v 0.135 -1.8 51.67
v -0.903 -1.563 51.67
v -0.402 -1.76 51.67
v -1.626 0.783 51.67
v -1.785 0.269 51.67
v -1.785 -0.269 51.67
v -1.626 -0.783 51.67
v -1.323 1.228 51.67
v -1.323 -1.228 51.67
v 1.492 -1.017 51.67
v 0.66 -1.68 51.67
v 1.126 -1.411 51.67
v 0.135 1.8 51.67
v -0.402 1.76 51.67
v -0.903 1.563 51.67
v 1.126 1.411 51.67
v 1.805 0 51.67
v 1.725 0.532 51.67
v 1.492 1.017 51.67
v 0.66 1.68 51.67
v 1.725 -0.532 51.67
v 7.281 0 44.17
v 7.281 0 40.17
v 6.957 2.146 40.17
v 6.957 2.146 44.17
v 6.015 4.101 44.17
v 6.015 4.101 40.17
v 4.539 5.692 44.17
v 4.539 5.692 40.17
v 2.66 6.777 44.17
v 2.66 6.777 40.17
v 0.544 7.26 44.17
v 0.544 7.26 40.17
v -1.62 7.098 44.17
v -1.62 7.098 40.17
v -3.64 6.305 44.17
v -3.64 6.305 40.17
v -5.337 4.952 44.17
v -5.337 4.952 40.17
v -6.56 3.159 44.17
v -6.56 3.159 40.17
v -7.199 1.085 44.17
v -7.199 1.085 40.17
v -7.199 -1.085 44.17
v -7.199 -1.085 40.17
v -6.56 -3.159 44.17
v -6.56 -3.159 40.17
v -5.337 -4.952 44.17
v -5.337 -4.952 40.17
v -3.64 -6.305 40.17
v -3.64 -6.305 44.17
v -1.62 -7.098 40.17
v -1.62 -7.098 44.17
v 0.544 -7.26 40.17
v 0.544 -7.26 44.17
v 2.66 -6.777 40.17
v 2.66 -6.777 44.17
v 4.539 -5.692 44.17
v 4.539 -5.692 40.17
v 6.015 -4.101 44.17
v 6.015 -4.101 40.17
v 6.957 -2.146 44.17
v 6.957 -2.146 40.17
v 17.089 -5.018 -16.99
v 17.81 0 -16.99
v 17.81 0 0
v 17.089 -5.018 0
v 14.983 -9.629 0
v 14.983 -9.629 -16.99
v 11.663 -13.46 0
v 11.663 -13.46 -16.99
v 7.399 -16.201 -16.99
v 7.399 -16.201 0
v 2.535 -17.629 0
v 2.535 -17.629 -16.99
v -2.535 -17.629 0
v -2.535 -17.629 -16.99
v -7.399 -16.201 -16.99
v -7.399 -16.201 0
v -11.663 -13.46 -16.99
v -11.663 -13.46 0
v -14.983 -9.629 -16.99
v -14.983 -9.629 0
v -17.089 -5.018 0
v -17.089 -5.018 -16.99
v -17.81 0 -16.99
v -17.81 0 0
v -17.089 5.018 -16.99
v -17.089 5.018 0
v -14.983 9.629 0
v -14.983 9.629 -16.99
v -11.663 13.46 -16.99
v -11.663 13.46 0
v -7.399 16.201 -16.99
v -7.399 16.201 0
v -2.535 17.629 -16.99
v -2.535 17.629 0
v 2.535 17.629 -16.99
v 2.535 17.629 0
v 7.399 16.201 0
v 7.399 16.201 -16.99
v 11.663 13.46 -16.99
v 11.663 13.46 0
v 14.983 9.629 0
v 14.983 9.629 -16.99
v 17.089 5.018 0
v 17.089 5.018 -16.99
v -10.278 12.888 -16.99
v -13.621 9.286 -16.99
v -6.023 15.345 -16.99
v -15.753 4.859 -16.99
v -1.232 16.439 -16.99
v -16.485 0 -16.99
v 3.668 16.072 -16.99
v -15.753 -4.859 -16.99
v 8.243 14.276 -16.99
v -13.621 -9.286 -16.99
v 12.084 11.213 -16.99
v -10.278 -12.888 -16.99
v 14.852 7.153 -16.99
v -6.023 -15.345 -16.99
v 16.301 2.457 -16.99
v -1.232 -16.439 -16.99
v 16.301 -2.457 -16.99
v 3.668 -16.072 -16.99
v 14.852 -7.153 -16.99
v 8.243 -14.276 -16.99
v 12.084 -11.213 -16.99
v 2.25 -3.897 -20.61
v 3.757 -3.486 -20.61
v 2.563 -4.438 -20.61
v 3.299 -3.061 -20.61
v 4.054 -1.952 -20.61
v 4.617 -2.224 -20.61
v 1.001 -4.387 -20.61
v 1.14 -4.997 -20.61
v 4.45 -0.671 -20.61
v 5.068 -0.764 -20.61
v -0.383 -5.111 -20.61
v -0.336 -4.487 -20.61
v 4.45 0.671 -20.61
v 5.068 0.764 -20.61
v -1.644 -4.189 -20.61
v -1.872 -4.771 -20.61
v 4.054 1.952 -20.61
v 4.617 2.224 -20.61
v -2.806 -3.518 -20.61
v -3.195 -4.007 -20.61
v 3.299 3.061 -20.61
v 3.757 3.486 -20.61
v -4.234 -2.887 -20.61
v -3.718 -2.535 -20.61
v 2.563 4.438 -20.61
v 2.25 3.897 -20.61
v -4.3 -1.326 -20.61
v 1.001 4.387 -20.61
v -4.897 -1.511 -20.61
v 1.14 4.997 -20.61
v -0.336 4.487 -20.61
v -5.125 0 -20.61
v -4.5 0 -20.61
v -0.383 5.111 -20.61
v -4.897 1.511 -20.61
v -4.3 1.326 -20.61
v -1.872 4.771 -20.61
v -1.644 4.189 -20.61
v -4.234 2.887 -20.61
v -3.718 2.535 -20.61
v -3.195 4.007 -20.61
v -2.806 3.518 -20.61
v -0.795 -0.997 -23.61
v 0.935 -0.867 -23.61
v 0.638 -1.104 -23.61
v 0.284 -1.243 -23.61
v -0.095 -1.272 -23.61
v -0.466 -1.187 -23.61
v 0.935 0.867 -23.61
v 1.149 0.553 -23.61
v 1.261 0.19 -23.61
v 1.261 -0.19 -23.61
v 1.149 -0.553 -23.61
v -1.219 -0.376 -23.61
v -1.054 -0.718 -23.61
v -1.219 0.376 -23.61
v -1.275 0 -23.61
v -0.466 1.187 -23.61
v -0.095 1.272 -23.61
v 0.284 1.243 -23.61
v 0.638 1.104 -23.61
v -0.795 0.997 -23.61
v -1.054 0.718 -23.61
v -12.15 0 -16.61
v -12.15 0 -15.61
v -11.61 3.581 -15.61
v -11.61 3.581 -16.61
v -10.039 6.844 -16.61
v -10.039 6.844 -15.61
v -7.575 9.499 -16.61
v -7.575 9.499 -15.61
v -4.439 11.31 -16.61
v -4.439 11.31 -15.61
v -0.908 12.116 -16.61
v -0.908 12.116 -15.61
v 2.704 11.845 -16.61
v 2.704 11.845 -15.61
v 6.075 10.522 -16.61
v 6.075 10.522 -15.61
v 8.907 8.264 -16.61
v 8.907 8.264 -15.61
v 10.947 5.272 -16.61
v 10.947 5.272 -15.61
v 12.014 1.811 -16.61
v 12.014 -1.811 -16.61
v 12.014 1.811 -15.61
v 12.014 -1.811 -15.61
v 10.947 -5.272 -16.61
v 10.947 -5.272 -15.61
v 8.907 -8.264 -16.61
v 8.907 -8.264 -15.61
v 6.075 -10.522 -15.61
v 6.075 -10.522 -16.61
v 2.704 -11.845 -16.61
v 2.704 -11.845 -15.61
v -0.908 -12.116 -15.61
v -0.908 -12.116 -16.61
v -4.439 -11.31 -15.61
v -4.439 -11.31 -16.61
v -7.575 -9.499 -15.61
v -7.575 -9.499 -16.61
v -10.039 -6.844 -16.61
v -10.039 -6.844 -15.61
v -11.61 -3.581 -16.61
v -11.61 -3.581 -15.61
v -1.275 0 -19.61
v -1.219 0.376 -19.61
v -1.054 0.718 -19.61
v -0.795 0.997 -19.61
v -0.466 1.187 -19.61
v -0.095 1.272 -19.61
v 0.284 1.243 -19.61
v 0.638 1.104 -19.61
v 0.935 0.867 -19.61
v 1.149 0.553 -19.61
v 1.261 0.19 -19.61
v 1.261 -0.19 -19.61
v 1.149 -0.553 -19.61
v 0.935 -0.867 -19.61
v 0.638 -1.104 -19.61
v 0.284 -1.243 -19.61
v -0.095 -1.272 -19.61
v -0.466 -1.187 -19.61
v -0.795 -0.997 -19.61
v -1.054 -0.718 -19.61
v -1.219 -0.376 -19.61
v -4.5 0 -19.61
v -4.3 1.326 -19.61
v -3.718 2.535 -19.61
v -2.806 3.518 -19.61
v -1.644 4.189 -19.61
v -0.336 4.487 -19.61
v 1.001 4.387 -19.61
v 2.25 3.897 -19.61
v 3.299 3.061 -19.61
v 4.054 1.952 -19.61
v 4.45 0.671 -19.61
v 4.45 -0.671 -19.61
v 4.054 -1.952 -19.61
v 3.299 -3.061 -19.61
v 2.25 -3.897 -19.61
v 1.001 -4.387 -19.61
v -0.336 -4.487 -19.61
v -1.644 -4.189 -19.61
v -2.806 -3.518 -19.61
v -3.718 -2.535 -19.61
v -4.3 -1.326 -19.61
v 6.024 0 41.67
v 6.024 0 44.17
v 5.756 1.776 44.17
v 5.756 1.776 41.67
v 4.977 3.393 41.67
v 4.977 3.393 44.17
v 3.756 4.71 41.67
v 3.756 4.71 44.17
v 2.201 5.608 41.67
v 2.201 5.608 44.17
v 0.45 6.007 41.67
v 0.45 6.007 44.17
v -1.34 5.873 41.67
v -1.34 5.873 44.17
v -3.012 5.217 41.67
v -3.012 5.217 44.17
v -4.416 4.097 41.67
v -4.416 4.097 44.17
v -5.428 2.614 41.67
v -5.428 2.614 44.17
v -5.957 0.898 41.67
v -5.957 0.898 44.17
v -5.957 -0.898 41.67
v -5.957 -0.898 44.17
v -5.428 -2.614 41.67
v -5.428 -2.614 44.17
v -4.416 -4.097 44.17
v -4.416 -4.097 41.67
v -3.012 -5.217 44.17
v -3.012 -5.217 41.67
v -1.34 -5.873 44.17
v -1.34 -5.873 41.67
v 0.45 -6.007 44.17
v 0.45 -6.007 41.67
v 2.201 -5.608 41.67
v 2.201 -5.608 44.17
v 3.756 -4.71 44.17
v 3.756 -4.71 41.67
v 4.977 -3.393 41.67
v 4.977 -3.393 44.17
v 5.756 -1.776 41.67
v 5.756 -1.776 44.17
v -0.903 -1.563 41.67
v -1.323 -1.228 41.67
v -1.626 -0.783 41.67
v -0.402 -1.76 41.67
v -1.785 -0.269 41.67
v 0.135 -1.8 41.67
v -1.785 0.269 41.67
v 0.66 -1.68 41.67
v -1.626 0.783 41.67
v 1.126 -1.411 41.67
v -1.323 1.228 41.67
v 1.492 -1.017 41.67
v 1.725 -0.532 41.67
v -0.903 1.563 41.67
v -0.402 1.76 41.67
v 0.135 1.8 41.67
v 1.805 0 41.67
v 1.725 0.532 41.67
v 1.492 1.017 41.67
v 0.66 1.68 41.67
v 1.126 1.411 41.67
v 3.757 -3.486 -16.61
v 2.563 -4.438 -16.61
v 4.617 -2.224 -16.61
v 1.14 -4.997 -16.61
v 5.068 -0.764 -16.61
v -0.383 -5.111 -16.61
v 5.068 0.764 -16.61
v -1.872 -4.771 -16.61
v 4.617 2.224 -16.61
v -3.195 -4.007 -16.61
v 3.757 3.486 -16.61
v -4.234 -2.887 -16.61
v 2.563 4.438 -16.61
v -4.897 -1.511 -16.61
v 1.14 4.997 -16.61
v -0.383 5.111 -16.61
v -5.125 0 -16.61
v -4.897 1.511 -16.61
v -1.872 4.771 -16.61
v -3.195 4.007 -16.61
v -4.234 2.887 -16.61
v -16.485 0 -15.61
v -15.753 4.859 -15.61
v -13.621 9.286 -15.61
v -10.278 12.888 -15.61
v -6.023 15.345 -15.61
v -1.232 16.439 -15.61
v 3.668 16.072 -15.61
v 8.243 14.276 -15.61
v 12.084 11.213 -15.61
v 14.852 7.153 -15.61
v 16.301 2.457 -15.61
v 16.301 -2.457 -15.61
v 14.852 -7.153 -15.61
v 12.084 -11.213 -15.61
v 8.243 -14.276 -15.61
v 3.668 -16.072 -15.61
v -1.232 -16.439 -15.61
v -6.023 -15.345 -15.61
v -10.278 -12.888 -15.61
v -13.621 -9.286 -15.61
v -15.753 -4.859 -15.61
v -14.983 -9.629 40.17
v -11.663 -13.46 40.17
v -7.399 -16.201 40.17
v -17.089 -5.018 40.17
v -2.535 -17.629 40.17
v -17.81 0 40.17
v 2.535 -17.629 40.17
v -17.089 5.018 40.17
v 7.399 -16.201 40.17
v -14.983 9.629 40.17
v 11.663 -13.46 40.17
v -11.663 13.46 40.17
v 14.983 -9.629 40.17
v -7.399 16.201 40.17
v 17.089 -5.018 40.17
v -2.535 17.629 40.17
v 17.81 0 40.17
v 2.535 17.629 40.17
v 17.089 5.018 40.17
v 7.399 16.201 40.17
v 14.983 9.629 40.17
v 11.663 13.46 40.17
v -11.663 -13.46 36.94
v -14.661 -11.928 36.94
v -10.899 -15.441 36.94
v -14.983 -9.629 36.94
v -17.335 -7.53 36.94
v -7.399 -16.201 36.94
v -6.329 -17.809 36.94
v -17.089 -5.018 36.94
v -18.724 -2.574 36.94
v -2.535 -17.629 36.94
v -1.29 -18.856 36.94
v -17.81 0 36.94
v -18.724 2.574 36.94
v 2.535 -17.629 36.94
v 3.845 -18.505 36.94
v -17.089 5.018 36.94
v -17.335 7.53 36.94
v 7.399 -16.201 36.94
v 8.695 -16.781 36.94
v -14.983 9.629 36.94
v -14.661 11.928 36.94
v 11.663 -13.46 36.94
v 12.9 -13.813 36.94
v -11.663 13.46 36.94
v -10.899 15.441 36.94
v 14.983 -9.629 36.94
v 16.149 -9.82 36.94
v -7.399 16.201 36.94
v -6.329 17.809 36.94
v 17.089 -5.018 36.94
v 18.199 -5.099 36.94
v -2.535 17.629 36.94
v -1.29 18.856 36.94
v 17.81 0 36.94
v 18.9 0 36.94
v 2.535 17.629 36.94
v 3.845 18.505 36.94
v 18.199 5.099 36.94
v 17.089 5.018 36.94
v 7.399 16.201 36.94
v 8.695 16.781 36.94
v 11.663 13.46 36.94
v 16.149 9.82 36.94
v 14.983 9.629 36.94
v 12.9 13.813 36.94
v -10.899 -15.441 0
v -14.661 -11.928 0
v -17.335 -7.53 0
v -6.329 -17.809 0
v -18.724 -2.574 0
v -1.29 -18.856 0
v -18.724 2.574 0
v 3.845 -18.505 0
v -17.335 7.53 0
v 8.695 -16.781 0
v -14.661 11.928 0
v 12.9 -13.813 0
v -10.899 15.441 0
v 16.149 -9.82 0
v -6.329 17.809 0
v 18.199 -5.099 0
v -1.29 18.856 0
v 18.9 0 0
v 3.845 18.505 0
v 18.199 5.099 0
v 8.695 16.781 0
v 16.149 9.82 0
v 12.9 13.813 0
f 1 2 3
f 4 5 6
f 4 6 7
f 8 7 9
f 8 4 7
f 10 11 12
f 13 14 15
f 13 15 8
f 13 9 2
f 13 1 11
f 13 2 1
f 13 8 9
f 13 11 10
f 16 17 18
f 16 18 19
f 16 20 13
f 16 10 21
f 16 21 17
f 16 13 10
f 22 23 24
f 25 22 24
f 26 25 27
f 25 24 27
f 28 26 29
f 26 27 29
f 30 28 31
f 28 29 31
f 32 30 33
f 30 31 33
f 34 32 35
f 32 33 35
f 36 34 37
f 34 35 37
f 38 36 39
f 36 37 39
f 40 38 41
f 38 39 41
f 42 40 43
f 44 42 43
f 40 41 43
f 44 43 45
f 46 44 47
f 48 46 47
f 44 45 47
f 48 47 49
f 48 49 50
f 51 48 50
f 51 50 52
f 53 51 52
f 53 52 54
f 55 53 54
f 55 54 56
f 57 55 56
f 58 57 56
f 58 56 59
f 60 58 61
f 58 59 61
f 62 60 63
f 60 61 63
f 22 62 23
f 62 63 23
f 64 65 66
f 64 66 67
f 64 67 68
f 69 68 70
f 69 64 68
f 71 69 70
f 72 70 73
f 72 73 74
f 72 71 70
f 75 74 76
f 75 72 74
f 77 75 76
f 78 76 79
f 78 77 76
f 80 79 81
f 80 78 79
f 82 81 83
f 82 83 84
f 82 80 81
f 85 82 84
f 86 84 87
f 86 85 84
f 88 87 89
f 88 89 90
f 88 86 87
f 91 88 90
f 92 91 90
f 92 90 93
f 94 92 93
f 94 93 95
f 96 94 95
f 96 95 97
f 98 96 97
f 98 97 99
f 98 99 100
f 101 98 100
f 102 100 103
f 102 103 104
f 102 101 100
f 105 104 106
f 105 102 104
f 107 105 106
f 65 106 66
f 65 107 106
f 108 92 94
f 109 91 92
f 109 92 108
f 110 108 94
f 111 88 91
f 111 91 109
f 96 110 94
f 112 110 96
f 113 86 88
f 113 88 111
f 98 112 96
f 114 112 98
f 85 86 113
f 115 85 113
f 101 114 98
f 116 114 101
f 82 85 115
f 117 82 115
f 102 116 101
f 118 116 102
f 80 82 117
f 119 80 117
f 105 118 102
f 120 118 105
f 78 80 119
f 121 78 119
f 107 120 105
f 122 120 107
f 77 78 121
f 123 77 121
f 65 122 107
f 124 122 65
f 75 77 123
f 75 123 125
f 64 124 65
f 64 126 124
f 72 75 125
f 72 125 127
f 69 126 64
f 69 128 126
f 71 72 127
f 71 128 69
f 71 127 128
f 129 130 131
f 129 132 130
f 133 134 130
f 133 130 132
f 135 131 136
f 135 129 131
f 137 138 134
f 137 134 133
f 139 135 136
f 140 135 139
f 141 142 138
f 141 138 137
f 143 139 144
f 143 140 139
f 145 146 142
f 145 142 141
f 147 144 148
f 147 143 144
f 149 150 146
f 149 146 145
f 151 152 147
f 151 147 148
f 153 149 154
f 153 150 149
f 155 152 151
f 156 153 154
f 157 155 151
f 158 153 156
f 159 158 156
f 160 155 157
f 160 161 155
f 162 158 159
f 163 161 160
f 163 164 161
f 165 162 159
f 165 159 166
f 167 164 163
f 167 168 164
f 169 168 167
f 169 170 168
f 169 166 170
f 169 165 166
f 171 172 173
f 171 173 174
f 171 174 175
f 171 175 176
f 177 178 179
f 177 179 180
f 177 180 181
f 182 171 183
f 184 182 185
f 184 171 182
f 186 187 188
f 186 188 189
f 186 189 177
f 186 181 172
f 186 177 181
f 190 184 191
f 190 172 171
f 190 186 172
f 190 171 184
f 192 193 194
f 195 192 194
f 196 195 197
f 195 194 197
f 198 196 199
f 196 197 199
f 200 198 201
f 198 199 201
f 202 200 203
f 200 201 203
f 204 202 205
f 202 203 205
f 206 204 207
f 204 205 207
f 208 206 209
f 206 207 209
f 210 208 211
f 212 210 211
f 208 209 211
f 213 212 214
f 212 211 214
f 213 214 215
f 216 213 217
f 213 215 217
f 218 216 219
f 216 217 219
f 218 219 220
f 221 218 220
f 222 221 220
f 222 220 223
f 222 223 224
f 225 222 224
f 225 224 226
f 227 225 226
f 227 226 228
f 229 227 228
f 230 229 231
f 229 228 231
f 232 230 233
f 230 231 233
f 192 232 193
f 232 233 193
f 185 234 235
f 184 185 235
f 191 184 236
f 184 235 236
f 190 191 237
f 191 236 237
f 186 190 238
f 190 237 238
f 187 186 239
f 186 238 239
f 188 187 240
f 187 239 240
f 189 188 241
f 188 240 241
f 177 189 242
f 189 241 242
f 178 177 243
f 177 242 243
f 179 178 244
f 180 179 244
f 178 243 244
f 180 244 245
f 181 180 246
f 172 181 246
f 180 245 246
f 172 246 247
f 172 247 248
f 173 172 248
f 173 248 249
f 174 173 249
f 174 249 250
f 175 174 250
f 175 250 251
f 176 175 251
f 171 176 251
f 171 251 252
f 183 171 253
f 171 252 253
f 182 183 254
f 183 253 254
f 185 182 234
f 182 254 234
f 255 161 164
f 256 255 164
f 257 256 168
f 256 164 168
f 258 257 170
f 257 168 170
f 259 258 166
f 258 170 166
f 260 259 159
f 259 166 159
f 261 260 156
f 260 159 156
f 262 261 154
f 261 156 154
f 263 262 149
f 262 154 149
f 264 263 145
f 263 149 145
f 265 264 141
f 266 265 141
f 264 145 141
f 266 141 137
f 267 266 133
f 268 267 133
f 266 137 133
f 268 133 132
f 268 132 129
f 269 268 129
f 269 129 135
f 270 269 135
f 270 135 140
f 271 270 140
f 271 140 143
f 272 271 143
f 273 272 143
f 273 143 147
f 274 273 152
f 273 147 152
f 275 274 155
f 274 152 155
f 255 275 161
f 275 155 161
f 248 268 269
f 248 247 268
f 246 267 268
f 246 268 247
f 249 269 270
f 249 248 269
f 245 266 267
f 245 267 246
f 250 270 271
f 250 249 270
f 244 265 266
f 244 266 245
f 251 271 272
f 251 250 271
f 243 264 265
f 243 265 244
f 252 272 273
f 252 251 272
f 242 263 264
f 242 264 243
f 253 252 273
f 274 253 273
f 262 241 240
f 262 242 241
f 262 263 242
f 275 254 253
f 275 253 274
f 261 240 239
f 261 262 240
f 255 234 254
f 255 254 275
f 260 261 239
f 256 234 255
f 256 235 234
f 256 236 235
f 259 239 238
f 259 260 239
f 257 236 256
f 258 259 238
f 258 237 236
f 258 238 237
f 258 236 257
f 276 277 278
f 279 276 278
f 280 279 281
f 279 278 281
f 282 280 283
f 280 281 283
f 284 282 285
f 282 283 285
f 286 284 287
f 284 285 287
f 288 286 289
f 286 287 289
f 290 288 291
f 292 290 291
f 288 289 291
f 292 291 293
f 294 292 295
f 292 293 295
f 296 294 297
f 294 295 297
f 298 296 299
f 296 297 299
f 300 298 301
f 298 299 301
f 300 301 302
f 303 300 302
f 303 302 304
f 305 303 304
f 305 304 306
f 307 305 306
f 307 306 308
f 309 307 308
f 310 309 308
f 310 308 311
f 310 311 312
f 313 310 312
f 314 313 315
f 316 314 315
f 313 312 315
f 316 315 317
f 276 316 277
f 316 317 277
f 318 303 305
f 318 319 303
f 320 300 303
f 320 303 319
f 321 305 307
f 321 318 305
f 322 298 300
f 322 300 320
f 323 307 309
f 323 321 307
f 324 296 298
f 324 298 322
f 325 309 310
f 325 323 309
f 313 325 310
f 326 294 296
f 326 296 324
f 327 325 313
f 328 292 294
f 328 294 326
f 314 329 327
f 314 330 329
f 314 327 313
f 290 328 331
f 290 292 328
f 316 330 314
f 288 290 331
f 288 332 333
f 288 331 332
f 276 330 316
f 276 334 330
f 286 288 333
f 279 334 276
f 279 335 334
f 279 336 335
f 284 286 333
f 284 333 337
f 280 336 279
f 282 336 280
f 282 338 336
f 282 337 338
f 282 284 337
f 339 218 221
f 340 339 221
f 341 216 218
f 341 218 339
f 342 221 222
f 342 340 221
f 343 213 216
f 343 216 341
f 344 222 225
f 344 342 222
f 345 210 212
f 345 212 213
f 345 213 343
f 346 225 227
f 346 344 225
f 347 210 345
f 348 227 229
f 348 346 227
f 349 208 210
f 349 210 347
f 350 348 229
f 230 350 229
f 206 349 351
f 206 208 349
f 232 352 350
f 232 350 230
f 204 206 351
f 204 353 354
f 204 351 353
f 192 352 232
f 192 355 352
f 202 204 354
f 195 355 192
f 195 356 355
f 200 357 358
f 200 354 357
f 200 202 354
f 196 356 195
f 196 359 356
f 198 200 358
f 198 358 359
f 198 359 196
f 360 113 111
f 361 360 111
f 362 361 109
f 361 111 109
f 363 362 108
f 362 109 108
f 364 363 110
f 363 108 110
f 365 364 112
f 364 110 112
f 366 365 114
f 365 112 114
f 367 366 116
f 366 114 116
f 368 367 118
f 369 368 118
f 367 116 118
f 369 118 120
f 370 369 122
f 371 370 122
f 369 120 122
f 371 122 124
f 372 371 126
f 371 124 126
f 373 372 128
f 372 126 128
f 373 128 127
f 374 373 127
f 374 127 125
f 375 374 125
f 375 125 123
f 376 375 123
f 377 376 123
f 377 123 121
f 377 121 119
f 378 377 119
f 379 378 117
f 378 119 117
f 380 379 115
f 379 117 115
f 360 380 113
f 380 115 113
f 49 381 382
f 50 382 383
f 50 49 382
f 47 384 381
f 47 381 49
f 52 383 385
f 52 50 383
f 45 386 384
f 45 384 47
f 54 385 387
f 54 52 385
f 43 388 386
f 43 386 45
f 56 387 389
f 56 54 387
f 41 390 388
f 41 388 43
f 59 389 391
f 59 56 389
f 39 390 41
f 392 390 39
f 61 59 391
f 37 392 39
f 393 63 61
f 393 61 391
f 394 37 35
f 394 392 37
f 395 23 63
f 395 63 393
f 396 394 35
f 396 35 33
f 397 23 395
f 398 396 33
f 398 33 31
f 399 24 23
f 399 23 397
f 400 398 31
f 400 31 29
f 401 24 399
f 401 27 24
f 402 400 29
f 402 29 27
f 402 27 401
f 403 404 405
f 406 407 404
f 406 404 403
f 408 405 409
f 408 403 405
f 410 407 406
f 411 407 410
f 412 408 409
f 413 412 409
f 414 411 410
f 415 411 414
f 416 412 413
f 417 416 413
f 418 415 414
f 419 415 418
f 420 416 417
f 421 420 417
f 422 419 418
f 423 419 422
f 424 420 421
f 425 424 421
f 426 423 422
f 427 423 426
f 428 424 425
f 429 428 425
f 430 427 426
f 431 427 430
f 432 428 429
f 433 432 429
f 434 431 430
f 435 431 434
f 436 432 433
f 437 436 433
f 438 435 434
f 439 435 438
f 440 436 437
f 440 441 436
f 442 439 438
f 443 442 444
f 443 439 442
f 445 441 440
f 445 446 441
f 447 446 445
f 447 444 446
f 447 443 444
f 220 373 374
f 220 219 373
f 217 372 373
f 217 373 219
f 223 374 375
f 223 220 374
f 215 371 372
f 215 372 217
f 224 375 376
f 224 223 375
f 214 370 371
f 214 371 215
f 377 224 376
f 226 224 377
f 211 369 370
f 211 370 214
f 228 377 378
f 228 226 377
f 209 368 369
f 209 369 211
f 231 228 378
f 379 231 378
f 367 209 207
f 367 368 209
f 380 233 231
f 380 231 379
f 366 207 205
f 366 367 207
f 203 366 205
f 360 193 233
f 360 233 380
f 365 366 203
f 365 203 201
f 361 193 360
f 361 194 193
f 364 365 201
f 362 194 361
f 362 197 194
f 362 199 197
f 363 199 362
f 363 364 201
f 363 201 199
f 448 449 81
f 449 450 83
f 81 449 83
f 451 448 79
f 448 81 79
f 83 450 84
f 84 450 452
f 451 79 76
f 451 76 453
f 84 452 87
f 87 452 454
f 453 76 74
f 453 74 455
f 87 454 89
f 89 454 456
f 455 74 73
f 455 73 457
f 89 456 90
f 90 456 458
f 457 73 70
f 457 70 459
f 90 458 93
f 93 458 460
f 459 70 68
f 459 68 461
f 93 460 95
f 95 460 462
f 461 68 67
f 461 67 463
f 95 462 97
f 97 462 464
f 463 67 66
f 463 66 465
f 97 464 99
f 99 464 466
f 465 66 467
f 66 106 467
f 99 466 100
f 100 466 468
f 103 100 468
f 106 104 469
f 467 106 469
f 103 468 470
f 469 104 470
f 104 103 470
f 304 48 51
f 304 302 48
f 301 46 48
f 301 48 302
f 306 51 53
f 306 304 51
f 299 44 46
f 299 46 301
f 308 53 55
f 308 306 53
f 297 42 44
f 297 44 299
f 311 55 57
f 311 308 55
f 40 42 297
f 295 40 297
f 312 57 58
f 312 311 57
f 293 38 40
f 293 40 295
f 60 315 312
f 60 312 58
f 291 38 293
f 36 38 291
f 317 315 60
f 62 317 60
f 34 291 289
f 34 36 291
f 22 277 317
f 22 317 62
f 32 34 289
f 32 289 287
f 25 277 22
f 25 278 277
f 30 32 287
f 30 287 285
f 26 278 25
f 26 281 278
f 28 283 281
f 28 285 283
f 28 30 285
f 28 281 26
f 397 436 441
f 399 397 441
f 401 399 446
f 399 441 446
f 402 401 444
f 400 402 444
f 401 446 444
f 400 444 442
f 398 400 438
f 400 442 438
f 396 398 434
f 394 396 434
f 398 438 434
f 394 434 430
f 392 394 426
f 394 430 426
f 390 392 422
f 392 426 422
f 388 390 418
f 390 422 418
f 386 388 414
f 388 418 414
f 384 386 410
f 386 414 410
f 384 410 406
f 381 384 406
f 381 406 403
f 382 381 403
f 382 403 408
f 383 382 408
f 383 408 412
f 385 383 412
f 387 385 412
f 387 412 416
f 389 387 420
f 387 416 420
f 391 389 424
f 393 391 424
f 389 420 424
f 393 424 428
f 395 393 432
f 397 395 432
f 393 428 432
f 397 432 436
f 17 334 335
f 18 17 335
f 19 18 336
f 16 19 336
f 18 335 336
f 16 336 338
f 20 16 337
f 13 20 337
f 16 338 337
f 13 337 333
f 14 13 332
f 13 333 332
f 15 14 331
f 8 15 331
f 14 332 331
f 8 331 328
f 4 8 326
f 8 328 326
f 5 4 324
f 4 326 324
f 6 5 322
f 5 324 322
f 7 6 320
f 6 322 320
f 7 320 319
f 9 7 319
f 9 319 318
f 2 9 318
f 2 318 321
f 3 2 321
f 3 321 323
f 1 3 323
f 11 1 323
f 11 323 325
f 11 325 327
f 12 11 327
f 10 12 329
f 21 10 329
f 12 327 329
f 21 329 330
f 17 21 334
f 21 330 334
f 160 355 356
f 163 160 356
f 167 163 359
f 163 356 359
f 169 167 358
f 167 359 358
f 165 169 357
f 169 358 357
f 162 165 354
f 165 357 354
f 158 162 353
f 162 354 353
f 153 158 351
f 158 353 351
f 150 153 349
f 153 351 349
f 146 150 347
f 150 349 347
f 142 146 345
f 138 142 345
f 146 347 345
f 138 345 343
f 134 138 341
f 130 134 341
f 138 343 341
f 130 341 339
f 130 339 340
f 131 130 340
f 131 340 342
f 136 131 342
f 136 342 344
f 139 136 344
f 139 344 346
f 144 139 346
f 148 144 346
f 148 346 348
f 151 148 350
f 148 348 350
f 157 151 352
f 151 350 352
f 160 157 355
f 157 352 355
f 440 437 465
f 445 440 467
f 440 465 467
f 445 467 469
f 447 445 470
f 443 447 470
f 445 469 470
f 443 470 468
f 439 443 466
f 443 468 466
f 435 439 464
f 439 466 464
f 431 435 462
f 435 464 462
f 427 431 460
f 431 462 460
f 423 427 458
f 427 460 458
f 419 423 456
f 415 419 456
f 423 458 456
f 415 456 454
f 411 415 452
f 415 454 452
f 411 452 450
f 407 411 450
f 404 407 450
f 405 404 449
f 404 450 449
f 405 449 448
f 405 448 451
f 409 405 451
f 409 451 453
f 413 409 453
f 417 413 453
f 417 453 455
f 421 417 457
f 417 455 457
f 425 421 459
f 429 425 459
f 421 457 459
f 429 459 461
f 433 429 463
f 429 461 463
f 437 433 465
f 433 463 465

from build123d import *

# Parameters (mm, degrees)
SKETCH_1_R          = 18.9
EXTRUDE_1_DEPTH     = 36.94
SKETCH_2_R          = 17.81
EXTRUDE_2_DEPTH     = 3.23
EXTRUDE_START       = 16.99
SKETCH_3_R          = 17.81
EXTRUDE_3_DEPTH     = 16.99
SKETCH_4_R          = 16.485
CUT_EXTRUDE_1_DEPTH = 1.38
SKETCH_5_R          = 12.15
EXTRUDE_4_DEPTH     = 1
SKETCH_6_R          = 5.125
EXTRUDE_5_DEPTH     = 4
SKETCH_7_R          = 4.49987444
CUT_EXTRUDE_2_DEPTH = 1
SKETCH_8_R          = 1.275207664
EXTRUDE_6_DEPTH     = 4
SKETCH_9_R          = 7.280511115
EXTRUDE_7_DEPTH     = 4
SKETCH_10_R         = 6.024089917
CUT_EXTRUDE_3_DEPTH = 2.5
SKETCH_11_R         = 1.805272954
EXTRUDE_9_DEPTH     = 10


with BuildPart() as part:
    # 草图1 → 凸台-拉伸1 (new body)
    with BuildSketch(Plane.XY):
        Circle(SKETCH_1_R)
    extrude(amount=EXTRUDE_1_DEPTH)

    # 草图2 → 凸台-拉伸2 (add)
    with BuildSketch(Plane.XY.offset(36.94)):
        Circle(SKETCH_2_R)
    extrude(amount=EXTRUDE_2_DEPTH)

    # 草图3 → 凸台-拉伸3 (add)
    with BuildSketch(Plane(origin=(0, 0, 0), x_dir=(-1, 0, 0), z_dir=(0, 0, -1)).offset(EXTRUDE_START)):
        with Locations(Location((0, 0, 0), (0, 0, 180))):
            Circle(SKETCH_3_R)
    extrude(amount=-EXTRUDE_3_DEPTH)

    # 草图4 → 切除-拉伸1 (cut)
    with BuildSketch(Plane(origin=(0, 0, -16.99), x_dir=(-1, 0, 0), z_dir=(0, 0, -1))):
        Circle(SKETCH_4_R)
    extrude(amount=-CUT_EXTRUDE_1_DEPTH, mode=Mode.SUBTRACT)

    # 草图5 → 凸台-拉伸4 (add)
    with BuildSketch(Plane(origin=(0, 0, -15.61), x_dir=(-1, 0, 0), z_dir=(0, 0, -1))):
        Circle(SKETCH_5_R)
    extrude(amount=EXTRUDE_4_DEPTH)

    # 草图6 → 凸台-拉伸5 (add)
    with BuildSketch(Plane(origin=(0, 0, -16.61), x_dir=(-1, 0, 0), z_dir=(0, 0, -1))):
        Circle(SKETCH_6_R)
    extrude(amount=EXTRUDE_5_DEPTH)

    # 草图7 → 切除-拉伸2 (cut)
    with BuildSketch(Plane(origin=(0, 0, -20.61), x_dir=(-1, 0, 0), z_dir=(0, 0, -1))):
        Circle(SKETCH_7_R)
    extrude(amount=-CUT_EXTRUDE_2_DEPTH, mode=Mode.SUBTRACT)

    # 草图8 → 凸台-拉伸6 (add)
    with BuildSketch(Plane(origin=(0, 0, -19.61), x_dir=(-1, 0, 0), z_dir=(0, 0, -1))):
        Circle(SKETCH_8_R)
    extrude(amount=EXTRUDE_6_DEPTH)

    # 草图9 → 凸台-拉伸7 (add)
    with BuildSketch(Plane.XY.offset(40.17)):
        Circle(SKETCH_9_R)
    extrude(amount=EXTRUDE_7_DEPTH)

    # 草图10 → 切除-拉伸3 (cut)
    with BuildSketch(Plane.XY.offset(44.17)):
        Circle(SKETCH_10_R)
    extrude(amount=-CUT_EXTRUDE_3_DEPTH, mode=Mode.SUBTRACT)

    # 草图11 → 凸台-拉伸9 (add)
    with BuildSketch(Plane.XY.offset(41.67)):
        Circle(SKETCH_11_R)
    extrude(amount=EXTRUDE_9_DEPTH)


solid = part.part
